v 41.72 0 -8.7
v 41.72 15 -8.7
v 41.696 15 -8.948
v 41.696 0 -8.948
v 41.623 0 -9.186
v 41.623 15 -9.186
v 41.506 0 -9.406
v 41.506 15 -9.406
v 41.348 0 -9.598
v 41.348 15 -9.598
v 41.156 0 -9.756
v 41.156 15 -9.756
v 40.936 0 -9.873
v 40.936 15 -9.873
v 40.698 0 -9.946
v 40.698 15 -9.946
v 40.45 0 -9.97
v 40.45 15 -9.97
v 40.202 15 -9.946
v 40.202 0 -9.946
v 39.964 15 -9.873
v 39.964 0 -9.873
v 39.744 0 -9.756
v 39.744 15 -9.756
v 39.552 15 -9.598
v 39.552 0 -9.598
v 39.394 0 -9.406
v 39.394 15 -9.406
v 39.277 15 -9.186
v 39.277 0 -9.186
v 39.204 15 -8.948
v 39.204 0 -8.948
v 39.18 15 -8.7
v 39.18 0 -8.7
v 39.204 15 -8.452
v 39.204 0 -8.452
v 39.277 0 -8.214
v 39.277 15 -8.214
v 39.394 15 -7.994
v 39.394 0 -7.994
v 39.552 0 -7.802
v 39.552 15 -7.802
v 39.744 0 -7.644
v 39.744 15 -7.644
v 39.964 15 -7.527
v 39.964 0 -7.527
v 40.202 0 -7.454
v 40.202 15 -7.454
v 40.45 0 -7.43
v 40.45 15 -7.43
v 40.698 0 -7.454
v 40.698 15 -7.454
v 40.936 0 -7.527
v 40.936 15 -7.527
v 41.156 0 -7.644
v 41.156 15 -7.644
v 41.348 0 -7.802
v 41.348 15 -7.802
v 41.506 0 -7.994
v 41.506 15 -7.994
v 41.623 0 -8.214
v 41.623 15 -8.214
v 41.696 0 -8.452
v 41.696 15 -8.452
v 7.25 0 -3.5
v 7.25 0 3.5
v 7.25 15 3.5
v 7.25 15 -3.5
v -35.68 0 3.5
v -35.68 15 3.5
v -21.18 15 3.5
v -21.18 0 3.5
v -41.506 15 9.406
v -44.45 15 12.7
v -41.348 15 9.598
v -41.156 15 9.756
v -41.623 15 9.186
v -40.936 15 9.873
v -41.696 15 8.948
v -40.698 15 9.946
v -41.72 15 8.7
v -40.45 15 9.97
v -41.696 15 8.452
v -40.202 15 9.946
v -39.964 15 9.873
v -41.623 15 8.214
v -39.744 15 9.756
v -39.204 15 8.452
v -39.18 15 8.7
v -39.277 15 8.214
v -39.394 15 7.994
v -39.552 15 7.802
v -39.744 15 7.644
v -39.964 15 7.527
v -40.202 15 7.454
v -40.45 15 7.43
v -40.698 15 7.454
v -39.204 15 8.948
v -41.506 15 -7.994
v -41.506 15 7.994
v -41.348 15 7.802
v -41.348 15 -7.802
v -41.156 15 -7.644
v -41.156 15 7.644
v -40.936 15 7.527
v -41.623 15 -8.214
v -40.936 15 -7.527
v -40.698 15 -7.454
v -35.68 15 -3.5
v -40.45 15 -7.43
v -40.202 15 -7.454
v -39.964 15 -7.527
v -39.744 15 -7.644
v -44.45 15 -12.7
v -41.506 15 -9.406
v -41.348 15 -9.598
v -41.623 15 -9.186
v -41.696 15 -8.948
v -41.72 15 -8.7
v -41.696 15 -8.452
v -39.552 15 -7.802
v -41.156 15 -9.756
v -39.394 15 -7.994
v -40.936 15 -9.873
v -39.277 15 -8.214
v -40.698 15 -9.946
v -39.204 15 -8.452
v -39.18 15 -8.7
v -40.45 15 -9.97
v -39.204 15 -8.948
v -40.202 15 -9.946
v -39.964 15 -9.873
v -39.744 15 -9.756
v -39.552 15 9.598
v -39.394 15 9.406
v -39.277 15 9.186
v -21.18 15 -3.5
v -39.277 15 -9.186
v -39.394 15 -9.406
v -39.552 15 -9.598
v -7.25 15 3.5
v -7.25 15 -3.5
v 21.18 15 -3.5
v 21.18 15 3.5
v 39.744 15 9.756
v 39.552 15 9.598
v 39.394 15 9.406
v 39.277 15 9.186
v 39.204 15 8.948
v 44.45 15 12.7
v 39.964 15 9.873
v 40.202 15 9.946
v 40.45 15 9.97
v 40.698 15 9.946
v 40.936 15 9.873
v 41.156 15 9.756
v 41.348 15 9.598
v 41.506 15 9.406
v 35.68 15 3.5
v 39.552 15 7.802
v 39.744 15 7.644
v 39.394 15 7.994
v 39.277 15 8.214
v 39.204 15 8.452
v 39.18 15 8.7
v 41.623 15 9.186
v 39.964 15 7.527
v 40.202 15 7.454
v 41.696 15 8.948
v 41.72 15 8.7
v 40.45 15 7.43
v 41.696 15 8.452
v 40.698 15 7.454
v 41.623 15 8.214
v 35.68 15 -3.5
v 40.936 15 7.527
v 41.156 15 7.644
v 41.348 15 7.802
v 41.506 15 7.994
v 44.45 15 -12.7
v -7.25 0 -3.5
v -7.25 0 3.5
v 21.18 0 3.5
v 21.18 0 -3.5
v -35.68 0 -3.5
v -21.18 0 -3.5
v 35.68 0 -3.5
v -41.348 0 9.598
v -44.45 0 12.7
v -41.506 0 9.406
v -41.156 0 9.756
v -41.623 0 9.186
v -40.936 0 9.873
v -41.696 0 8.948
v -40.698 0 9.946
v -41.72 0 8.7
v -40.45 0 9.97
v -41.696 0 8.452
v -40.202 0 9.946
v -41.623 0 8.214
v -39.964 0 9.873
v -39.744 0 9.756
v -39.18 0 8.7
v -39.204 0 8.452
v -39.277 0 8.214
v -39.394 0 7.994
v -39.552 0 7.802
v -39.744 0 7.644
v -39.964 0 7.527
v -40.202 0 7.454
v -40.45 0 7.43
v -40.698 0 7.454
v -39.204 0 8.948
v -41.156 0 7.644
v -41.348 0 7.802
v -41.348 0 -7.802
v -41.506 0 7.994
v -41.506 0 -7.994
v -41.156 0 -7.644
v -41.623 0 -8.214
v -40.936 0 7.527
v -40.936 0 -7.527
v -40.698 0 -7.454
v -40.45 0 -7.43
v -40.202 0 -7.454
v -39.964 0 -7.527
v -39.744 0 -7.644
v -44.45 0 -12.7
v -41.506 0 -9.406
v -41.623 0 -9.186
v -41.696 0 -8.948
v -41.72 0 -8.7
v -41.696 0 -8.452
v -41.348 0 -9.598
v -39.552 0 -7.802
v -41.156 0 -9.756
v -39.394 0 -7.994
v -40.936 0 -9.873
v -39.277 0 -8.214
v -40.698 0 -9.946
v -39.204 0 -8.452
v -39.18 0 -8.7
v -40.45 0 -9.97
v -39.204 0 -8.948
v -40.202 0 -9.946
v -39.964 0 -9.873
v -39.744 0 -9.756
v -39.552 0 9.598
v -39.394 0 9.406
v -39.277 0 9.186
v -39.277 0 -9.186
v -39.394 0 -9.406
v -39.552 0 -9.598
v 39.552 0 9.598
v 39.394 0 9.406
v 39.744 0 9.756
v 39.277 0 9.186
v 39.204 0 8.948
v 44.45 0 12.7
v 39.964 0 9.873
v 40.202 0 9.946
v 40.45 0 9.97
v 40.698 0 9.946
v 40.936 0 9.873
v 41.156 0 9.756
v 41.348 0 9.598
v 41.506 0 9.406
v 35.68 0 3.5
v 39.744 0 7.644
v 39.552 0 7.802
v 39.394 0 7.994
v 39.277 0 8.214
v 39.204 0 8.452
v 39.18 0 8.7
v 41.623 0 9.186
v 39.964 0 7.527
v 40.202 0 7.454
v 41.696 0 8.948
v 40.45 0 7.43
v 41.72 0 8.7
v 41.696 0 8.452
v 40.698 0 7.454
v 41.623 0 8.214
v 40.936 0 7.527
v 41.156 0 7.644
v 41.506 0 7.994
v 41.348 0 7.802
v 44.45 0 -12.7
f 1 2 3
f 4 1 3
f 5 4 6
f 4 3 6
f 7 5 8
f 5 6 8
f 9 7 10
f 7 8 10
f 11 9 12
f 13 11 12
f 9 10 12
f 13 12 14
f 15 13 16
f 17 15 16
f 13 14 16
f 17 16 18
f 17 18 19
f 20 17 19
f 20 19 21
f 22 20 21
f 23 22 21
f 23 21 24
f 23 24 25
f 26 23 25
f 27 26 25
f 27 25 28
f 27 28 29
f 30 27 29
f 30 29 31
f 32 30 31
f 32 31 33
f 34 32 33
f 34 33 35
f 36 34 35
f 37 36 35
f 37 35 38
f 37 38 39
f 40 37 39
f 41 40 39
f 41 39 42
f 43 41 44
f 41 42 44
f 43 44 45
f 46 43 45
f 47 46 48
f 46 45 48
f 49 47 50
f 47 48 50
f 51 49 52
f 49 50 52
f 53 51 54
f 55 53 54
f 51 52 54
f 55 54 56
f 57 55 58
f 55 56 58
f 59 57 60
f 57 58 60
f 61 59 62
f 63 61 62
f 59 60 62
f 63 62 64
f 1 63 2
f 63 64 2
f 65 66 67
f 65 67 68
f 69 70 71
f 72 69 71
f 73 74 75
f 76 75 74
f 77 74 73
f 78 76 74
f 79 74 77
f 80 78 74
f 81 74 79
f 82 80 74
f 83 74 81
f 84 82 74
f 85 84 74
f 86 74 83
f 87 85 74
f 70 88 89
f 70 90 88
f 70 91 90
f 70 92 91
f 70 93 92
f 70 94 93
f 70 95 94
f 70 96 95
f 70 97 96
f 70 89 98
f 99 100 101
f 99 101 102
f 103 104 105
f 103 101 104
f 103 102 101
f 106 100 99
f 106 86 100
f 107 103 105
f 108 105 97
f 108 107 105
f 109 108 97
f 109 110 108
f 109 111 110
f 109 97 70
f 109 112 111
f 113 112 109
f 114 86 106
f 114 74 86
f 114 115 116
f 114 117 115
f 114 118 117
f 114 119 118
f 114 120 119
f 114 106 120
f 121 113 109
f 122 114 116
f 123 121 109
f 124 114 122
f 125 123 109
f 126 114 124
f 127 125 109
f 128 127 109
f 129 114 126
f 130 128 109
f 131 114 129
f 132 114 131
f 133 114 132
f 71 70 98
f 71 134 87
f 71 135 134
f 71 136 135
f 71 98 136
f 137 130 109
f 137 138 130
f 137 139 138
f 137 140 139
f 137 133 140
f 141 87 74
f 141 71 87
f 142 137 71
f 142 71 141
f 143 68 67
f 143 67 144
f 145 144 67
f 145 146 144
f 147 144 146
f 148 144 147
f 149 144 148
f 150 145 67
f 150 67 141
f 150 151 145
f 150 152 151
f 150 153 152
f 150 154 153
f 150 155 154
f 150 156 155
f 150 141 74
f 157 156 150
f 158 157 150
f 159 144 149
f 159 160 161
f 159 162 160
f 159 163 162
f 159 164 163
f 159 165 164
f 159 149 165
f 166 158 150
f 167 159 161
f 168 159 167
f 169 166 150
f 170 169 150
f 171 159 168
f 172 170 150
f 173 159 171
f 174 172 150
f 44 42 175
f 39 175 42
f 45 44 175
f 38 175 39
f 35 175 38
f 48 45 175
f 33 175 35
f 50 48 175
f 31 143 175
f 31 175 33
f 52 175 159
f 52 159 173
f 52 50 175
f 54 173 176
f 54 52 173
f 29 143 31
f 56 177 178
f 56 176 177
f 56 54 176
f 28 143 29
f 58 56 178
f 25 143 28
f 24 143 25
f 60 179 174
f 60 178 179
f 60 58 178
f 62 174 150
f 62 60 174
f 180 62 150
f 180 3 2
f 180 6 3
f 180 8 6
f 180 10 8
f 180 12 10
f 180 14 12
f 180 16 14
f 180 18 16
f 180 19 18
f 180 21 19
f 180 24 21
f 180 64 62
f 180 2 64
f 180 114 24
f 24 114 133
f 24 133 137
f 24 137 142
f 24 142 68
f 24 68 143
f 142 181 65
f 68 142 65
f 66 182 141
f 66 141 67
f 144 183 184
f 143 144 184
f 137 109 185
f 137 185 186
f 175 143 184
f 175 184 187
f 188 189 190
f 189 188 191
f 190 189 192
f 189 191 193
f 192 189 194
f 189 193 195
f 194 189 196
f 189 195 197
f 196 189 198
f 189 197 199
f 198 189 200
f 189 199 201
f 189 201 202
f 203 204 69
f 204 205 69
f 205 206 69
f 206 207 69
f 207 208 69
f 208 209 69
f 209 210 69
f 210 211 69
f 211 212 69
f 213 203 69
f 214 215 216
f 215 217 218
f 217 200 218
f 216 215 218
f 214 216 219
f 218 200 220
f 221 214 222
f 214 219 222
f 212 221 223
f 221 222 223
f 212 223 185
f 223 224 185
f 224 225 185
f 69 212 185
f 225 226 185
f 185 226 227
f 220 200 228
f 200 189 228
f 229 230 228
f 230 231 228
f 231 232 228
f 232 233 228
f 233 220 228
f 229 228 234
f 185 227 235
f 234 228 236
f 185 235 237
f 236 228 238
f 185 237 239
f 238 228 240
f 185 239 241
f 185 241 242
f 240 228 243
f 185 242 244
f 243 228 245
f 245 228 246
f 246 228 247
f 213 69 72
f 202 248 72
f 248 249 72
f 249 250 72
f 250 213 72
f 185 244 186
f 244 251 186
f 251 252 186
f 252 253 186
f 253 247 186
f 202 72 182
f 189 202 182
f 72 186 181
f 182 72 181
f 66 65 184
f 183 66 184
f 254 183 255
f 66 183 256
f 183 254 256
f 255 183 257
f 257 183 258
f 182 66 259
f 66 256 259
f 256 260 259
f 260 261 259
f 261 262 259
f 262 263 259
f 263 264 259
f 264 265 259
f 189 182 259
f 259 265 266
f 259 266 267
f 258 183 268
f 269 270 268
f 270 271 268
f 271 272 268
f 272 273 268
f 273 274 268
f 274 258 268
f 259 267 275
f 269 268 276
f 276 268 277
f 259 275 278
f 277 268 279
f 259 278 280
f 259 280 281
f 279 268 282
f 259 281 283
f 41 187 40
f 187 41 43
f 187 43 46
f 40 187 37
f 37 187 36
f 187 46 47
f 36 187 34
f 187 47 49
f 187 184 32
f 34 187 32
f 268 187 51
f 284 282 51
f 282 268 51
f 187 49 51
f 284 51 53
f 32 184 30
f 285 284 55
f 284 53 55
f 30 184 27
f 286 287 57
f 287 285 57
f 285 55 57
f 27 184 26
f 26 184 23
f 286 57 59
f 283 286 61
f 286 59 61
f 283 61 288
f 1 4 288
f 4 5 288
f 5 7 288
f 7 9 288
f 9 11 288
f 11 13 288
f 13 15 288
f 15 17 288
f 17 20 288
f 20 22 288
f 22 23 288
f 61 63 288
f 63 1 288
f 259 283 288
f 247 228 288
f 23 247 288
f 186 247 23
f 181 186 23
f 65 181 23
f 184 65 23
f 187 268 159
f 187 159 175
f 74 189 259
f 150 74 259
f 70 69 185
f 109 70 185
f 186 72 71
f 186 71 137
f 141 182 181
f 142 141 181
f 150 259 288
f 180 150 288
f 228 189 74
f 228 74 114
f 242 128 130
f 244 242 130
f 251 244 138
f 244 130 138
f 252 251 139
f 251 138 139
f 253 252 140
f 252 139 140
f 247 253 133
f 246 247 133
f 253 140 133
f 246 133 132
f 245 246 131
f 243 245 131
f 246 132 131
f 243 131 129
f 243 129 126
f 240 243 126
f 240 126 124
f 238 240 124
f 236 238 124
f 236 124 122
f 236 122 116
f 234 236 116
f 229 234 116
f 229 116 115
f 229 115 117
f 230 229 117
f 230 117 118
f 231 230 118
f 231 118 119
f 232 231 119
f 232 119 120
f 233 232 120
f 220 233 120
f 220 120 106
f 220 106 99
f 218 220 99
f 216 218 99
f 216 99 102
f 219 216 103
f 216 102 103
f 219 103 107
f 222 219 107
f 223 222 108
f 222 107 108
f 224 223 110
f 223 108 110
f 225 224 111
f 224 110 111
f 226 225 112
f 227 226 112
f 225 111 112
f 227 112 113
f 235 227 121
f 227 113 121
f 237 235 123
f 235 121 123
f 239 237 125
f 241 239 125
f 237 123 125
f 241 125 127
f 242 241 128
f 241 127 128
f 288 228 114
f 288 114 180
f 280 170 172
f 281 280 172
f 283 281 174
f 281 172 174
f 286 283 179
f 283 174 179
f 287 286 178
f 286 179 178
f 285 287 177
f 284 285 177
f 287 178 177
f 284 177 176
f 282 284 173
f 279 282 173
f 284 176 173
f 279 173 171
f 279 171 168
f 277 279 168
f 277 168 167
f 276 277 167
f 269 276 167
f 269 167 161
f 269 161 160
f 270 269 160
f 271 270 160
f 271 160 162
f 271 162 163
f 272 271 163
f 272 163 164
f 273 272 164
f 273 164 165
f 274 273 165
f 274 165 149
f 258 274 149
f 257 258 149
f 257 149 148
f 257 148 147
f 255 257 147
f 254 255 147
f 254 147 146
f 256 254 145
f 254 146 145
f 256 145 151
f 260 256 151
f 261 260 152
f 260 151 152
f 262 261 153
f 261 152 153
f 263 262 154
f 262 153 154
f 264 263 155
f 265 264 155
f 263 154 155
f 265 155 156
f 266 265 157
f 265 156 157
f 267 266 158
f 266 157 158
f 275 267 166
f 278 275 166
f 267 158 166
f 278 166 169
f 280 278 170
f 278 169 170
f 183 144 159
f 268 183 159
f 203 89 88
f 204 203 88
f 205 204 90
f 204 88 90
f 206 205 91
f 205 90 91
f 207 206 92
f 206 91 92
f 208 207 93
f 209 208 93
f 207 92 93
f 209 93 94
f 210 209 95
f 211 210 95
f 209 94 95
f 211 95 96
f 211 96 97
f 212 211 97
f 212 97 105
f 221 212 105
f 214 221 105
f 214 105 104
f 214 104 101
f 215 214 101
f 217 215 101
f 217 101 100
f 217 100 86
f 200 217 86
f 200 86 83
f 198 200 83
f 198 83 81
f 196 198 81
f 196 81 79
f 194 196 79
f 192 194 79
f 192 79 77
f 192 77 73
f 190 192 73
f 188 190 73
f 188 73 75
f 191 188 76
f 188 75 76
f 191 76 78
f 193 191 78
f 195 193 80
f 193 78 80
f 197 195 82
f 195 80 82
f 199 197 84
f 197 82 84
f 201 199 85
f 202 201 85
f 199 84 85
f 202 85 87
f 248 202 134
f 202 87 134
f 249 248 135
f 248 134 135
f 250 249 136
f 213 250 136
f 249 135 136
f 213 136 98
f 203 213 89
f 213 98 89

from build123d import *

# Parameters (mm, degrees)
SKETCH1_W           = 88.9
SKETCH1_H           = 25.4
BOSS_EXTRUDE1_DEPTH = 14.999999972
SKETCH2_W           = 14.499999956
SKETCH2_H           = 6.99999997
CUT_EXTRUDE1_DEPTH  = 25.4
SKETCH3_R           = 1.27
CUT_EXTRUDE3_DEPTH  = 25.4


with BuildPart() as part:
    # Sketch1 → Boss-Extrude1 (new body)
    with BuildSketch(Plane(origin=(0, 0, 0), x_dir=(1, 0, 0), z_dir=(0, 1, 0))):
        Rectangle(SKETCH1_W, SKETCH1_H)
    extrude(amount=BOSS_EXTRUDE1_DEPTH)

    # Sketch2 → Cut-Extrude1 (cut)
    with BuildSketch(Plane(origin=(0, 14.999999972, 0), x_dir=(1, 0, 0), z_dir=(0, 1, 0))):
        Rectangle(SKETCH2_W, SKETCH2_H)
        with Locations((-28.430000036, 0)):
            Rectangle(SKETCH2_W, SKETCH2_H)
        with Locations((28.430000036, 0)):
            Rectangle(SKETCH2_W, SKETCH2_H)
    extrude(amount=-CUT_EXTRUDE1_DEPTH, mode=Mode.SUBTRACT)

    # Sketch3 → Cut-Extrude3 (cut)
    with BuildSketch(Plane(origin=(0, 14.999999972, 0), x_dir=(1, 0, 0), z_dir=(0, 1, 0))):
        with Locations((-40.45, 8.7)):
            Circle(SKETCH3_R)
        with Locations((40.45, 8.7)):
            Circle(SKETCH3_R)
        with Locations((-40.45, -8.7)):
            Circle(SKETCH3_R)
        with Locations((40.45, -8.7)):
            Circle(SKETCH3_R)
    extrude(amount=-CUT_EXTRUDE3_DEPTH, mode=Mode.SUBTRACT)


solid = part.part
